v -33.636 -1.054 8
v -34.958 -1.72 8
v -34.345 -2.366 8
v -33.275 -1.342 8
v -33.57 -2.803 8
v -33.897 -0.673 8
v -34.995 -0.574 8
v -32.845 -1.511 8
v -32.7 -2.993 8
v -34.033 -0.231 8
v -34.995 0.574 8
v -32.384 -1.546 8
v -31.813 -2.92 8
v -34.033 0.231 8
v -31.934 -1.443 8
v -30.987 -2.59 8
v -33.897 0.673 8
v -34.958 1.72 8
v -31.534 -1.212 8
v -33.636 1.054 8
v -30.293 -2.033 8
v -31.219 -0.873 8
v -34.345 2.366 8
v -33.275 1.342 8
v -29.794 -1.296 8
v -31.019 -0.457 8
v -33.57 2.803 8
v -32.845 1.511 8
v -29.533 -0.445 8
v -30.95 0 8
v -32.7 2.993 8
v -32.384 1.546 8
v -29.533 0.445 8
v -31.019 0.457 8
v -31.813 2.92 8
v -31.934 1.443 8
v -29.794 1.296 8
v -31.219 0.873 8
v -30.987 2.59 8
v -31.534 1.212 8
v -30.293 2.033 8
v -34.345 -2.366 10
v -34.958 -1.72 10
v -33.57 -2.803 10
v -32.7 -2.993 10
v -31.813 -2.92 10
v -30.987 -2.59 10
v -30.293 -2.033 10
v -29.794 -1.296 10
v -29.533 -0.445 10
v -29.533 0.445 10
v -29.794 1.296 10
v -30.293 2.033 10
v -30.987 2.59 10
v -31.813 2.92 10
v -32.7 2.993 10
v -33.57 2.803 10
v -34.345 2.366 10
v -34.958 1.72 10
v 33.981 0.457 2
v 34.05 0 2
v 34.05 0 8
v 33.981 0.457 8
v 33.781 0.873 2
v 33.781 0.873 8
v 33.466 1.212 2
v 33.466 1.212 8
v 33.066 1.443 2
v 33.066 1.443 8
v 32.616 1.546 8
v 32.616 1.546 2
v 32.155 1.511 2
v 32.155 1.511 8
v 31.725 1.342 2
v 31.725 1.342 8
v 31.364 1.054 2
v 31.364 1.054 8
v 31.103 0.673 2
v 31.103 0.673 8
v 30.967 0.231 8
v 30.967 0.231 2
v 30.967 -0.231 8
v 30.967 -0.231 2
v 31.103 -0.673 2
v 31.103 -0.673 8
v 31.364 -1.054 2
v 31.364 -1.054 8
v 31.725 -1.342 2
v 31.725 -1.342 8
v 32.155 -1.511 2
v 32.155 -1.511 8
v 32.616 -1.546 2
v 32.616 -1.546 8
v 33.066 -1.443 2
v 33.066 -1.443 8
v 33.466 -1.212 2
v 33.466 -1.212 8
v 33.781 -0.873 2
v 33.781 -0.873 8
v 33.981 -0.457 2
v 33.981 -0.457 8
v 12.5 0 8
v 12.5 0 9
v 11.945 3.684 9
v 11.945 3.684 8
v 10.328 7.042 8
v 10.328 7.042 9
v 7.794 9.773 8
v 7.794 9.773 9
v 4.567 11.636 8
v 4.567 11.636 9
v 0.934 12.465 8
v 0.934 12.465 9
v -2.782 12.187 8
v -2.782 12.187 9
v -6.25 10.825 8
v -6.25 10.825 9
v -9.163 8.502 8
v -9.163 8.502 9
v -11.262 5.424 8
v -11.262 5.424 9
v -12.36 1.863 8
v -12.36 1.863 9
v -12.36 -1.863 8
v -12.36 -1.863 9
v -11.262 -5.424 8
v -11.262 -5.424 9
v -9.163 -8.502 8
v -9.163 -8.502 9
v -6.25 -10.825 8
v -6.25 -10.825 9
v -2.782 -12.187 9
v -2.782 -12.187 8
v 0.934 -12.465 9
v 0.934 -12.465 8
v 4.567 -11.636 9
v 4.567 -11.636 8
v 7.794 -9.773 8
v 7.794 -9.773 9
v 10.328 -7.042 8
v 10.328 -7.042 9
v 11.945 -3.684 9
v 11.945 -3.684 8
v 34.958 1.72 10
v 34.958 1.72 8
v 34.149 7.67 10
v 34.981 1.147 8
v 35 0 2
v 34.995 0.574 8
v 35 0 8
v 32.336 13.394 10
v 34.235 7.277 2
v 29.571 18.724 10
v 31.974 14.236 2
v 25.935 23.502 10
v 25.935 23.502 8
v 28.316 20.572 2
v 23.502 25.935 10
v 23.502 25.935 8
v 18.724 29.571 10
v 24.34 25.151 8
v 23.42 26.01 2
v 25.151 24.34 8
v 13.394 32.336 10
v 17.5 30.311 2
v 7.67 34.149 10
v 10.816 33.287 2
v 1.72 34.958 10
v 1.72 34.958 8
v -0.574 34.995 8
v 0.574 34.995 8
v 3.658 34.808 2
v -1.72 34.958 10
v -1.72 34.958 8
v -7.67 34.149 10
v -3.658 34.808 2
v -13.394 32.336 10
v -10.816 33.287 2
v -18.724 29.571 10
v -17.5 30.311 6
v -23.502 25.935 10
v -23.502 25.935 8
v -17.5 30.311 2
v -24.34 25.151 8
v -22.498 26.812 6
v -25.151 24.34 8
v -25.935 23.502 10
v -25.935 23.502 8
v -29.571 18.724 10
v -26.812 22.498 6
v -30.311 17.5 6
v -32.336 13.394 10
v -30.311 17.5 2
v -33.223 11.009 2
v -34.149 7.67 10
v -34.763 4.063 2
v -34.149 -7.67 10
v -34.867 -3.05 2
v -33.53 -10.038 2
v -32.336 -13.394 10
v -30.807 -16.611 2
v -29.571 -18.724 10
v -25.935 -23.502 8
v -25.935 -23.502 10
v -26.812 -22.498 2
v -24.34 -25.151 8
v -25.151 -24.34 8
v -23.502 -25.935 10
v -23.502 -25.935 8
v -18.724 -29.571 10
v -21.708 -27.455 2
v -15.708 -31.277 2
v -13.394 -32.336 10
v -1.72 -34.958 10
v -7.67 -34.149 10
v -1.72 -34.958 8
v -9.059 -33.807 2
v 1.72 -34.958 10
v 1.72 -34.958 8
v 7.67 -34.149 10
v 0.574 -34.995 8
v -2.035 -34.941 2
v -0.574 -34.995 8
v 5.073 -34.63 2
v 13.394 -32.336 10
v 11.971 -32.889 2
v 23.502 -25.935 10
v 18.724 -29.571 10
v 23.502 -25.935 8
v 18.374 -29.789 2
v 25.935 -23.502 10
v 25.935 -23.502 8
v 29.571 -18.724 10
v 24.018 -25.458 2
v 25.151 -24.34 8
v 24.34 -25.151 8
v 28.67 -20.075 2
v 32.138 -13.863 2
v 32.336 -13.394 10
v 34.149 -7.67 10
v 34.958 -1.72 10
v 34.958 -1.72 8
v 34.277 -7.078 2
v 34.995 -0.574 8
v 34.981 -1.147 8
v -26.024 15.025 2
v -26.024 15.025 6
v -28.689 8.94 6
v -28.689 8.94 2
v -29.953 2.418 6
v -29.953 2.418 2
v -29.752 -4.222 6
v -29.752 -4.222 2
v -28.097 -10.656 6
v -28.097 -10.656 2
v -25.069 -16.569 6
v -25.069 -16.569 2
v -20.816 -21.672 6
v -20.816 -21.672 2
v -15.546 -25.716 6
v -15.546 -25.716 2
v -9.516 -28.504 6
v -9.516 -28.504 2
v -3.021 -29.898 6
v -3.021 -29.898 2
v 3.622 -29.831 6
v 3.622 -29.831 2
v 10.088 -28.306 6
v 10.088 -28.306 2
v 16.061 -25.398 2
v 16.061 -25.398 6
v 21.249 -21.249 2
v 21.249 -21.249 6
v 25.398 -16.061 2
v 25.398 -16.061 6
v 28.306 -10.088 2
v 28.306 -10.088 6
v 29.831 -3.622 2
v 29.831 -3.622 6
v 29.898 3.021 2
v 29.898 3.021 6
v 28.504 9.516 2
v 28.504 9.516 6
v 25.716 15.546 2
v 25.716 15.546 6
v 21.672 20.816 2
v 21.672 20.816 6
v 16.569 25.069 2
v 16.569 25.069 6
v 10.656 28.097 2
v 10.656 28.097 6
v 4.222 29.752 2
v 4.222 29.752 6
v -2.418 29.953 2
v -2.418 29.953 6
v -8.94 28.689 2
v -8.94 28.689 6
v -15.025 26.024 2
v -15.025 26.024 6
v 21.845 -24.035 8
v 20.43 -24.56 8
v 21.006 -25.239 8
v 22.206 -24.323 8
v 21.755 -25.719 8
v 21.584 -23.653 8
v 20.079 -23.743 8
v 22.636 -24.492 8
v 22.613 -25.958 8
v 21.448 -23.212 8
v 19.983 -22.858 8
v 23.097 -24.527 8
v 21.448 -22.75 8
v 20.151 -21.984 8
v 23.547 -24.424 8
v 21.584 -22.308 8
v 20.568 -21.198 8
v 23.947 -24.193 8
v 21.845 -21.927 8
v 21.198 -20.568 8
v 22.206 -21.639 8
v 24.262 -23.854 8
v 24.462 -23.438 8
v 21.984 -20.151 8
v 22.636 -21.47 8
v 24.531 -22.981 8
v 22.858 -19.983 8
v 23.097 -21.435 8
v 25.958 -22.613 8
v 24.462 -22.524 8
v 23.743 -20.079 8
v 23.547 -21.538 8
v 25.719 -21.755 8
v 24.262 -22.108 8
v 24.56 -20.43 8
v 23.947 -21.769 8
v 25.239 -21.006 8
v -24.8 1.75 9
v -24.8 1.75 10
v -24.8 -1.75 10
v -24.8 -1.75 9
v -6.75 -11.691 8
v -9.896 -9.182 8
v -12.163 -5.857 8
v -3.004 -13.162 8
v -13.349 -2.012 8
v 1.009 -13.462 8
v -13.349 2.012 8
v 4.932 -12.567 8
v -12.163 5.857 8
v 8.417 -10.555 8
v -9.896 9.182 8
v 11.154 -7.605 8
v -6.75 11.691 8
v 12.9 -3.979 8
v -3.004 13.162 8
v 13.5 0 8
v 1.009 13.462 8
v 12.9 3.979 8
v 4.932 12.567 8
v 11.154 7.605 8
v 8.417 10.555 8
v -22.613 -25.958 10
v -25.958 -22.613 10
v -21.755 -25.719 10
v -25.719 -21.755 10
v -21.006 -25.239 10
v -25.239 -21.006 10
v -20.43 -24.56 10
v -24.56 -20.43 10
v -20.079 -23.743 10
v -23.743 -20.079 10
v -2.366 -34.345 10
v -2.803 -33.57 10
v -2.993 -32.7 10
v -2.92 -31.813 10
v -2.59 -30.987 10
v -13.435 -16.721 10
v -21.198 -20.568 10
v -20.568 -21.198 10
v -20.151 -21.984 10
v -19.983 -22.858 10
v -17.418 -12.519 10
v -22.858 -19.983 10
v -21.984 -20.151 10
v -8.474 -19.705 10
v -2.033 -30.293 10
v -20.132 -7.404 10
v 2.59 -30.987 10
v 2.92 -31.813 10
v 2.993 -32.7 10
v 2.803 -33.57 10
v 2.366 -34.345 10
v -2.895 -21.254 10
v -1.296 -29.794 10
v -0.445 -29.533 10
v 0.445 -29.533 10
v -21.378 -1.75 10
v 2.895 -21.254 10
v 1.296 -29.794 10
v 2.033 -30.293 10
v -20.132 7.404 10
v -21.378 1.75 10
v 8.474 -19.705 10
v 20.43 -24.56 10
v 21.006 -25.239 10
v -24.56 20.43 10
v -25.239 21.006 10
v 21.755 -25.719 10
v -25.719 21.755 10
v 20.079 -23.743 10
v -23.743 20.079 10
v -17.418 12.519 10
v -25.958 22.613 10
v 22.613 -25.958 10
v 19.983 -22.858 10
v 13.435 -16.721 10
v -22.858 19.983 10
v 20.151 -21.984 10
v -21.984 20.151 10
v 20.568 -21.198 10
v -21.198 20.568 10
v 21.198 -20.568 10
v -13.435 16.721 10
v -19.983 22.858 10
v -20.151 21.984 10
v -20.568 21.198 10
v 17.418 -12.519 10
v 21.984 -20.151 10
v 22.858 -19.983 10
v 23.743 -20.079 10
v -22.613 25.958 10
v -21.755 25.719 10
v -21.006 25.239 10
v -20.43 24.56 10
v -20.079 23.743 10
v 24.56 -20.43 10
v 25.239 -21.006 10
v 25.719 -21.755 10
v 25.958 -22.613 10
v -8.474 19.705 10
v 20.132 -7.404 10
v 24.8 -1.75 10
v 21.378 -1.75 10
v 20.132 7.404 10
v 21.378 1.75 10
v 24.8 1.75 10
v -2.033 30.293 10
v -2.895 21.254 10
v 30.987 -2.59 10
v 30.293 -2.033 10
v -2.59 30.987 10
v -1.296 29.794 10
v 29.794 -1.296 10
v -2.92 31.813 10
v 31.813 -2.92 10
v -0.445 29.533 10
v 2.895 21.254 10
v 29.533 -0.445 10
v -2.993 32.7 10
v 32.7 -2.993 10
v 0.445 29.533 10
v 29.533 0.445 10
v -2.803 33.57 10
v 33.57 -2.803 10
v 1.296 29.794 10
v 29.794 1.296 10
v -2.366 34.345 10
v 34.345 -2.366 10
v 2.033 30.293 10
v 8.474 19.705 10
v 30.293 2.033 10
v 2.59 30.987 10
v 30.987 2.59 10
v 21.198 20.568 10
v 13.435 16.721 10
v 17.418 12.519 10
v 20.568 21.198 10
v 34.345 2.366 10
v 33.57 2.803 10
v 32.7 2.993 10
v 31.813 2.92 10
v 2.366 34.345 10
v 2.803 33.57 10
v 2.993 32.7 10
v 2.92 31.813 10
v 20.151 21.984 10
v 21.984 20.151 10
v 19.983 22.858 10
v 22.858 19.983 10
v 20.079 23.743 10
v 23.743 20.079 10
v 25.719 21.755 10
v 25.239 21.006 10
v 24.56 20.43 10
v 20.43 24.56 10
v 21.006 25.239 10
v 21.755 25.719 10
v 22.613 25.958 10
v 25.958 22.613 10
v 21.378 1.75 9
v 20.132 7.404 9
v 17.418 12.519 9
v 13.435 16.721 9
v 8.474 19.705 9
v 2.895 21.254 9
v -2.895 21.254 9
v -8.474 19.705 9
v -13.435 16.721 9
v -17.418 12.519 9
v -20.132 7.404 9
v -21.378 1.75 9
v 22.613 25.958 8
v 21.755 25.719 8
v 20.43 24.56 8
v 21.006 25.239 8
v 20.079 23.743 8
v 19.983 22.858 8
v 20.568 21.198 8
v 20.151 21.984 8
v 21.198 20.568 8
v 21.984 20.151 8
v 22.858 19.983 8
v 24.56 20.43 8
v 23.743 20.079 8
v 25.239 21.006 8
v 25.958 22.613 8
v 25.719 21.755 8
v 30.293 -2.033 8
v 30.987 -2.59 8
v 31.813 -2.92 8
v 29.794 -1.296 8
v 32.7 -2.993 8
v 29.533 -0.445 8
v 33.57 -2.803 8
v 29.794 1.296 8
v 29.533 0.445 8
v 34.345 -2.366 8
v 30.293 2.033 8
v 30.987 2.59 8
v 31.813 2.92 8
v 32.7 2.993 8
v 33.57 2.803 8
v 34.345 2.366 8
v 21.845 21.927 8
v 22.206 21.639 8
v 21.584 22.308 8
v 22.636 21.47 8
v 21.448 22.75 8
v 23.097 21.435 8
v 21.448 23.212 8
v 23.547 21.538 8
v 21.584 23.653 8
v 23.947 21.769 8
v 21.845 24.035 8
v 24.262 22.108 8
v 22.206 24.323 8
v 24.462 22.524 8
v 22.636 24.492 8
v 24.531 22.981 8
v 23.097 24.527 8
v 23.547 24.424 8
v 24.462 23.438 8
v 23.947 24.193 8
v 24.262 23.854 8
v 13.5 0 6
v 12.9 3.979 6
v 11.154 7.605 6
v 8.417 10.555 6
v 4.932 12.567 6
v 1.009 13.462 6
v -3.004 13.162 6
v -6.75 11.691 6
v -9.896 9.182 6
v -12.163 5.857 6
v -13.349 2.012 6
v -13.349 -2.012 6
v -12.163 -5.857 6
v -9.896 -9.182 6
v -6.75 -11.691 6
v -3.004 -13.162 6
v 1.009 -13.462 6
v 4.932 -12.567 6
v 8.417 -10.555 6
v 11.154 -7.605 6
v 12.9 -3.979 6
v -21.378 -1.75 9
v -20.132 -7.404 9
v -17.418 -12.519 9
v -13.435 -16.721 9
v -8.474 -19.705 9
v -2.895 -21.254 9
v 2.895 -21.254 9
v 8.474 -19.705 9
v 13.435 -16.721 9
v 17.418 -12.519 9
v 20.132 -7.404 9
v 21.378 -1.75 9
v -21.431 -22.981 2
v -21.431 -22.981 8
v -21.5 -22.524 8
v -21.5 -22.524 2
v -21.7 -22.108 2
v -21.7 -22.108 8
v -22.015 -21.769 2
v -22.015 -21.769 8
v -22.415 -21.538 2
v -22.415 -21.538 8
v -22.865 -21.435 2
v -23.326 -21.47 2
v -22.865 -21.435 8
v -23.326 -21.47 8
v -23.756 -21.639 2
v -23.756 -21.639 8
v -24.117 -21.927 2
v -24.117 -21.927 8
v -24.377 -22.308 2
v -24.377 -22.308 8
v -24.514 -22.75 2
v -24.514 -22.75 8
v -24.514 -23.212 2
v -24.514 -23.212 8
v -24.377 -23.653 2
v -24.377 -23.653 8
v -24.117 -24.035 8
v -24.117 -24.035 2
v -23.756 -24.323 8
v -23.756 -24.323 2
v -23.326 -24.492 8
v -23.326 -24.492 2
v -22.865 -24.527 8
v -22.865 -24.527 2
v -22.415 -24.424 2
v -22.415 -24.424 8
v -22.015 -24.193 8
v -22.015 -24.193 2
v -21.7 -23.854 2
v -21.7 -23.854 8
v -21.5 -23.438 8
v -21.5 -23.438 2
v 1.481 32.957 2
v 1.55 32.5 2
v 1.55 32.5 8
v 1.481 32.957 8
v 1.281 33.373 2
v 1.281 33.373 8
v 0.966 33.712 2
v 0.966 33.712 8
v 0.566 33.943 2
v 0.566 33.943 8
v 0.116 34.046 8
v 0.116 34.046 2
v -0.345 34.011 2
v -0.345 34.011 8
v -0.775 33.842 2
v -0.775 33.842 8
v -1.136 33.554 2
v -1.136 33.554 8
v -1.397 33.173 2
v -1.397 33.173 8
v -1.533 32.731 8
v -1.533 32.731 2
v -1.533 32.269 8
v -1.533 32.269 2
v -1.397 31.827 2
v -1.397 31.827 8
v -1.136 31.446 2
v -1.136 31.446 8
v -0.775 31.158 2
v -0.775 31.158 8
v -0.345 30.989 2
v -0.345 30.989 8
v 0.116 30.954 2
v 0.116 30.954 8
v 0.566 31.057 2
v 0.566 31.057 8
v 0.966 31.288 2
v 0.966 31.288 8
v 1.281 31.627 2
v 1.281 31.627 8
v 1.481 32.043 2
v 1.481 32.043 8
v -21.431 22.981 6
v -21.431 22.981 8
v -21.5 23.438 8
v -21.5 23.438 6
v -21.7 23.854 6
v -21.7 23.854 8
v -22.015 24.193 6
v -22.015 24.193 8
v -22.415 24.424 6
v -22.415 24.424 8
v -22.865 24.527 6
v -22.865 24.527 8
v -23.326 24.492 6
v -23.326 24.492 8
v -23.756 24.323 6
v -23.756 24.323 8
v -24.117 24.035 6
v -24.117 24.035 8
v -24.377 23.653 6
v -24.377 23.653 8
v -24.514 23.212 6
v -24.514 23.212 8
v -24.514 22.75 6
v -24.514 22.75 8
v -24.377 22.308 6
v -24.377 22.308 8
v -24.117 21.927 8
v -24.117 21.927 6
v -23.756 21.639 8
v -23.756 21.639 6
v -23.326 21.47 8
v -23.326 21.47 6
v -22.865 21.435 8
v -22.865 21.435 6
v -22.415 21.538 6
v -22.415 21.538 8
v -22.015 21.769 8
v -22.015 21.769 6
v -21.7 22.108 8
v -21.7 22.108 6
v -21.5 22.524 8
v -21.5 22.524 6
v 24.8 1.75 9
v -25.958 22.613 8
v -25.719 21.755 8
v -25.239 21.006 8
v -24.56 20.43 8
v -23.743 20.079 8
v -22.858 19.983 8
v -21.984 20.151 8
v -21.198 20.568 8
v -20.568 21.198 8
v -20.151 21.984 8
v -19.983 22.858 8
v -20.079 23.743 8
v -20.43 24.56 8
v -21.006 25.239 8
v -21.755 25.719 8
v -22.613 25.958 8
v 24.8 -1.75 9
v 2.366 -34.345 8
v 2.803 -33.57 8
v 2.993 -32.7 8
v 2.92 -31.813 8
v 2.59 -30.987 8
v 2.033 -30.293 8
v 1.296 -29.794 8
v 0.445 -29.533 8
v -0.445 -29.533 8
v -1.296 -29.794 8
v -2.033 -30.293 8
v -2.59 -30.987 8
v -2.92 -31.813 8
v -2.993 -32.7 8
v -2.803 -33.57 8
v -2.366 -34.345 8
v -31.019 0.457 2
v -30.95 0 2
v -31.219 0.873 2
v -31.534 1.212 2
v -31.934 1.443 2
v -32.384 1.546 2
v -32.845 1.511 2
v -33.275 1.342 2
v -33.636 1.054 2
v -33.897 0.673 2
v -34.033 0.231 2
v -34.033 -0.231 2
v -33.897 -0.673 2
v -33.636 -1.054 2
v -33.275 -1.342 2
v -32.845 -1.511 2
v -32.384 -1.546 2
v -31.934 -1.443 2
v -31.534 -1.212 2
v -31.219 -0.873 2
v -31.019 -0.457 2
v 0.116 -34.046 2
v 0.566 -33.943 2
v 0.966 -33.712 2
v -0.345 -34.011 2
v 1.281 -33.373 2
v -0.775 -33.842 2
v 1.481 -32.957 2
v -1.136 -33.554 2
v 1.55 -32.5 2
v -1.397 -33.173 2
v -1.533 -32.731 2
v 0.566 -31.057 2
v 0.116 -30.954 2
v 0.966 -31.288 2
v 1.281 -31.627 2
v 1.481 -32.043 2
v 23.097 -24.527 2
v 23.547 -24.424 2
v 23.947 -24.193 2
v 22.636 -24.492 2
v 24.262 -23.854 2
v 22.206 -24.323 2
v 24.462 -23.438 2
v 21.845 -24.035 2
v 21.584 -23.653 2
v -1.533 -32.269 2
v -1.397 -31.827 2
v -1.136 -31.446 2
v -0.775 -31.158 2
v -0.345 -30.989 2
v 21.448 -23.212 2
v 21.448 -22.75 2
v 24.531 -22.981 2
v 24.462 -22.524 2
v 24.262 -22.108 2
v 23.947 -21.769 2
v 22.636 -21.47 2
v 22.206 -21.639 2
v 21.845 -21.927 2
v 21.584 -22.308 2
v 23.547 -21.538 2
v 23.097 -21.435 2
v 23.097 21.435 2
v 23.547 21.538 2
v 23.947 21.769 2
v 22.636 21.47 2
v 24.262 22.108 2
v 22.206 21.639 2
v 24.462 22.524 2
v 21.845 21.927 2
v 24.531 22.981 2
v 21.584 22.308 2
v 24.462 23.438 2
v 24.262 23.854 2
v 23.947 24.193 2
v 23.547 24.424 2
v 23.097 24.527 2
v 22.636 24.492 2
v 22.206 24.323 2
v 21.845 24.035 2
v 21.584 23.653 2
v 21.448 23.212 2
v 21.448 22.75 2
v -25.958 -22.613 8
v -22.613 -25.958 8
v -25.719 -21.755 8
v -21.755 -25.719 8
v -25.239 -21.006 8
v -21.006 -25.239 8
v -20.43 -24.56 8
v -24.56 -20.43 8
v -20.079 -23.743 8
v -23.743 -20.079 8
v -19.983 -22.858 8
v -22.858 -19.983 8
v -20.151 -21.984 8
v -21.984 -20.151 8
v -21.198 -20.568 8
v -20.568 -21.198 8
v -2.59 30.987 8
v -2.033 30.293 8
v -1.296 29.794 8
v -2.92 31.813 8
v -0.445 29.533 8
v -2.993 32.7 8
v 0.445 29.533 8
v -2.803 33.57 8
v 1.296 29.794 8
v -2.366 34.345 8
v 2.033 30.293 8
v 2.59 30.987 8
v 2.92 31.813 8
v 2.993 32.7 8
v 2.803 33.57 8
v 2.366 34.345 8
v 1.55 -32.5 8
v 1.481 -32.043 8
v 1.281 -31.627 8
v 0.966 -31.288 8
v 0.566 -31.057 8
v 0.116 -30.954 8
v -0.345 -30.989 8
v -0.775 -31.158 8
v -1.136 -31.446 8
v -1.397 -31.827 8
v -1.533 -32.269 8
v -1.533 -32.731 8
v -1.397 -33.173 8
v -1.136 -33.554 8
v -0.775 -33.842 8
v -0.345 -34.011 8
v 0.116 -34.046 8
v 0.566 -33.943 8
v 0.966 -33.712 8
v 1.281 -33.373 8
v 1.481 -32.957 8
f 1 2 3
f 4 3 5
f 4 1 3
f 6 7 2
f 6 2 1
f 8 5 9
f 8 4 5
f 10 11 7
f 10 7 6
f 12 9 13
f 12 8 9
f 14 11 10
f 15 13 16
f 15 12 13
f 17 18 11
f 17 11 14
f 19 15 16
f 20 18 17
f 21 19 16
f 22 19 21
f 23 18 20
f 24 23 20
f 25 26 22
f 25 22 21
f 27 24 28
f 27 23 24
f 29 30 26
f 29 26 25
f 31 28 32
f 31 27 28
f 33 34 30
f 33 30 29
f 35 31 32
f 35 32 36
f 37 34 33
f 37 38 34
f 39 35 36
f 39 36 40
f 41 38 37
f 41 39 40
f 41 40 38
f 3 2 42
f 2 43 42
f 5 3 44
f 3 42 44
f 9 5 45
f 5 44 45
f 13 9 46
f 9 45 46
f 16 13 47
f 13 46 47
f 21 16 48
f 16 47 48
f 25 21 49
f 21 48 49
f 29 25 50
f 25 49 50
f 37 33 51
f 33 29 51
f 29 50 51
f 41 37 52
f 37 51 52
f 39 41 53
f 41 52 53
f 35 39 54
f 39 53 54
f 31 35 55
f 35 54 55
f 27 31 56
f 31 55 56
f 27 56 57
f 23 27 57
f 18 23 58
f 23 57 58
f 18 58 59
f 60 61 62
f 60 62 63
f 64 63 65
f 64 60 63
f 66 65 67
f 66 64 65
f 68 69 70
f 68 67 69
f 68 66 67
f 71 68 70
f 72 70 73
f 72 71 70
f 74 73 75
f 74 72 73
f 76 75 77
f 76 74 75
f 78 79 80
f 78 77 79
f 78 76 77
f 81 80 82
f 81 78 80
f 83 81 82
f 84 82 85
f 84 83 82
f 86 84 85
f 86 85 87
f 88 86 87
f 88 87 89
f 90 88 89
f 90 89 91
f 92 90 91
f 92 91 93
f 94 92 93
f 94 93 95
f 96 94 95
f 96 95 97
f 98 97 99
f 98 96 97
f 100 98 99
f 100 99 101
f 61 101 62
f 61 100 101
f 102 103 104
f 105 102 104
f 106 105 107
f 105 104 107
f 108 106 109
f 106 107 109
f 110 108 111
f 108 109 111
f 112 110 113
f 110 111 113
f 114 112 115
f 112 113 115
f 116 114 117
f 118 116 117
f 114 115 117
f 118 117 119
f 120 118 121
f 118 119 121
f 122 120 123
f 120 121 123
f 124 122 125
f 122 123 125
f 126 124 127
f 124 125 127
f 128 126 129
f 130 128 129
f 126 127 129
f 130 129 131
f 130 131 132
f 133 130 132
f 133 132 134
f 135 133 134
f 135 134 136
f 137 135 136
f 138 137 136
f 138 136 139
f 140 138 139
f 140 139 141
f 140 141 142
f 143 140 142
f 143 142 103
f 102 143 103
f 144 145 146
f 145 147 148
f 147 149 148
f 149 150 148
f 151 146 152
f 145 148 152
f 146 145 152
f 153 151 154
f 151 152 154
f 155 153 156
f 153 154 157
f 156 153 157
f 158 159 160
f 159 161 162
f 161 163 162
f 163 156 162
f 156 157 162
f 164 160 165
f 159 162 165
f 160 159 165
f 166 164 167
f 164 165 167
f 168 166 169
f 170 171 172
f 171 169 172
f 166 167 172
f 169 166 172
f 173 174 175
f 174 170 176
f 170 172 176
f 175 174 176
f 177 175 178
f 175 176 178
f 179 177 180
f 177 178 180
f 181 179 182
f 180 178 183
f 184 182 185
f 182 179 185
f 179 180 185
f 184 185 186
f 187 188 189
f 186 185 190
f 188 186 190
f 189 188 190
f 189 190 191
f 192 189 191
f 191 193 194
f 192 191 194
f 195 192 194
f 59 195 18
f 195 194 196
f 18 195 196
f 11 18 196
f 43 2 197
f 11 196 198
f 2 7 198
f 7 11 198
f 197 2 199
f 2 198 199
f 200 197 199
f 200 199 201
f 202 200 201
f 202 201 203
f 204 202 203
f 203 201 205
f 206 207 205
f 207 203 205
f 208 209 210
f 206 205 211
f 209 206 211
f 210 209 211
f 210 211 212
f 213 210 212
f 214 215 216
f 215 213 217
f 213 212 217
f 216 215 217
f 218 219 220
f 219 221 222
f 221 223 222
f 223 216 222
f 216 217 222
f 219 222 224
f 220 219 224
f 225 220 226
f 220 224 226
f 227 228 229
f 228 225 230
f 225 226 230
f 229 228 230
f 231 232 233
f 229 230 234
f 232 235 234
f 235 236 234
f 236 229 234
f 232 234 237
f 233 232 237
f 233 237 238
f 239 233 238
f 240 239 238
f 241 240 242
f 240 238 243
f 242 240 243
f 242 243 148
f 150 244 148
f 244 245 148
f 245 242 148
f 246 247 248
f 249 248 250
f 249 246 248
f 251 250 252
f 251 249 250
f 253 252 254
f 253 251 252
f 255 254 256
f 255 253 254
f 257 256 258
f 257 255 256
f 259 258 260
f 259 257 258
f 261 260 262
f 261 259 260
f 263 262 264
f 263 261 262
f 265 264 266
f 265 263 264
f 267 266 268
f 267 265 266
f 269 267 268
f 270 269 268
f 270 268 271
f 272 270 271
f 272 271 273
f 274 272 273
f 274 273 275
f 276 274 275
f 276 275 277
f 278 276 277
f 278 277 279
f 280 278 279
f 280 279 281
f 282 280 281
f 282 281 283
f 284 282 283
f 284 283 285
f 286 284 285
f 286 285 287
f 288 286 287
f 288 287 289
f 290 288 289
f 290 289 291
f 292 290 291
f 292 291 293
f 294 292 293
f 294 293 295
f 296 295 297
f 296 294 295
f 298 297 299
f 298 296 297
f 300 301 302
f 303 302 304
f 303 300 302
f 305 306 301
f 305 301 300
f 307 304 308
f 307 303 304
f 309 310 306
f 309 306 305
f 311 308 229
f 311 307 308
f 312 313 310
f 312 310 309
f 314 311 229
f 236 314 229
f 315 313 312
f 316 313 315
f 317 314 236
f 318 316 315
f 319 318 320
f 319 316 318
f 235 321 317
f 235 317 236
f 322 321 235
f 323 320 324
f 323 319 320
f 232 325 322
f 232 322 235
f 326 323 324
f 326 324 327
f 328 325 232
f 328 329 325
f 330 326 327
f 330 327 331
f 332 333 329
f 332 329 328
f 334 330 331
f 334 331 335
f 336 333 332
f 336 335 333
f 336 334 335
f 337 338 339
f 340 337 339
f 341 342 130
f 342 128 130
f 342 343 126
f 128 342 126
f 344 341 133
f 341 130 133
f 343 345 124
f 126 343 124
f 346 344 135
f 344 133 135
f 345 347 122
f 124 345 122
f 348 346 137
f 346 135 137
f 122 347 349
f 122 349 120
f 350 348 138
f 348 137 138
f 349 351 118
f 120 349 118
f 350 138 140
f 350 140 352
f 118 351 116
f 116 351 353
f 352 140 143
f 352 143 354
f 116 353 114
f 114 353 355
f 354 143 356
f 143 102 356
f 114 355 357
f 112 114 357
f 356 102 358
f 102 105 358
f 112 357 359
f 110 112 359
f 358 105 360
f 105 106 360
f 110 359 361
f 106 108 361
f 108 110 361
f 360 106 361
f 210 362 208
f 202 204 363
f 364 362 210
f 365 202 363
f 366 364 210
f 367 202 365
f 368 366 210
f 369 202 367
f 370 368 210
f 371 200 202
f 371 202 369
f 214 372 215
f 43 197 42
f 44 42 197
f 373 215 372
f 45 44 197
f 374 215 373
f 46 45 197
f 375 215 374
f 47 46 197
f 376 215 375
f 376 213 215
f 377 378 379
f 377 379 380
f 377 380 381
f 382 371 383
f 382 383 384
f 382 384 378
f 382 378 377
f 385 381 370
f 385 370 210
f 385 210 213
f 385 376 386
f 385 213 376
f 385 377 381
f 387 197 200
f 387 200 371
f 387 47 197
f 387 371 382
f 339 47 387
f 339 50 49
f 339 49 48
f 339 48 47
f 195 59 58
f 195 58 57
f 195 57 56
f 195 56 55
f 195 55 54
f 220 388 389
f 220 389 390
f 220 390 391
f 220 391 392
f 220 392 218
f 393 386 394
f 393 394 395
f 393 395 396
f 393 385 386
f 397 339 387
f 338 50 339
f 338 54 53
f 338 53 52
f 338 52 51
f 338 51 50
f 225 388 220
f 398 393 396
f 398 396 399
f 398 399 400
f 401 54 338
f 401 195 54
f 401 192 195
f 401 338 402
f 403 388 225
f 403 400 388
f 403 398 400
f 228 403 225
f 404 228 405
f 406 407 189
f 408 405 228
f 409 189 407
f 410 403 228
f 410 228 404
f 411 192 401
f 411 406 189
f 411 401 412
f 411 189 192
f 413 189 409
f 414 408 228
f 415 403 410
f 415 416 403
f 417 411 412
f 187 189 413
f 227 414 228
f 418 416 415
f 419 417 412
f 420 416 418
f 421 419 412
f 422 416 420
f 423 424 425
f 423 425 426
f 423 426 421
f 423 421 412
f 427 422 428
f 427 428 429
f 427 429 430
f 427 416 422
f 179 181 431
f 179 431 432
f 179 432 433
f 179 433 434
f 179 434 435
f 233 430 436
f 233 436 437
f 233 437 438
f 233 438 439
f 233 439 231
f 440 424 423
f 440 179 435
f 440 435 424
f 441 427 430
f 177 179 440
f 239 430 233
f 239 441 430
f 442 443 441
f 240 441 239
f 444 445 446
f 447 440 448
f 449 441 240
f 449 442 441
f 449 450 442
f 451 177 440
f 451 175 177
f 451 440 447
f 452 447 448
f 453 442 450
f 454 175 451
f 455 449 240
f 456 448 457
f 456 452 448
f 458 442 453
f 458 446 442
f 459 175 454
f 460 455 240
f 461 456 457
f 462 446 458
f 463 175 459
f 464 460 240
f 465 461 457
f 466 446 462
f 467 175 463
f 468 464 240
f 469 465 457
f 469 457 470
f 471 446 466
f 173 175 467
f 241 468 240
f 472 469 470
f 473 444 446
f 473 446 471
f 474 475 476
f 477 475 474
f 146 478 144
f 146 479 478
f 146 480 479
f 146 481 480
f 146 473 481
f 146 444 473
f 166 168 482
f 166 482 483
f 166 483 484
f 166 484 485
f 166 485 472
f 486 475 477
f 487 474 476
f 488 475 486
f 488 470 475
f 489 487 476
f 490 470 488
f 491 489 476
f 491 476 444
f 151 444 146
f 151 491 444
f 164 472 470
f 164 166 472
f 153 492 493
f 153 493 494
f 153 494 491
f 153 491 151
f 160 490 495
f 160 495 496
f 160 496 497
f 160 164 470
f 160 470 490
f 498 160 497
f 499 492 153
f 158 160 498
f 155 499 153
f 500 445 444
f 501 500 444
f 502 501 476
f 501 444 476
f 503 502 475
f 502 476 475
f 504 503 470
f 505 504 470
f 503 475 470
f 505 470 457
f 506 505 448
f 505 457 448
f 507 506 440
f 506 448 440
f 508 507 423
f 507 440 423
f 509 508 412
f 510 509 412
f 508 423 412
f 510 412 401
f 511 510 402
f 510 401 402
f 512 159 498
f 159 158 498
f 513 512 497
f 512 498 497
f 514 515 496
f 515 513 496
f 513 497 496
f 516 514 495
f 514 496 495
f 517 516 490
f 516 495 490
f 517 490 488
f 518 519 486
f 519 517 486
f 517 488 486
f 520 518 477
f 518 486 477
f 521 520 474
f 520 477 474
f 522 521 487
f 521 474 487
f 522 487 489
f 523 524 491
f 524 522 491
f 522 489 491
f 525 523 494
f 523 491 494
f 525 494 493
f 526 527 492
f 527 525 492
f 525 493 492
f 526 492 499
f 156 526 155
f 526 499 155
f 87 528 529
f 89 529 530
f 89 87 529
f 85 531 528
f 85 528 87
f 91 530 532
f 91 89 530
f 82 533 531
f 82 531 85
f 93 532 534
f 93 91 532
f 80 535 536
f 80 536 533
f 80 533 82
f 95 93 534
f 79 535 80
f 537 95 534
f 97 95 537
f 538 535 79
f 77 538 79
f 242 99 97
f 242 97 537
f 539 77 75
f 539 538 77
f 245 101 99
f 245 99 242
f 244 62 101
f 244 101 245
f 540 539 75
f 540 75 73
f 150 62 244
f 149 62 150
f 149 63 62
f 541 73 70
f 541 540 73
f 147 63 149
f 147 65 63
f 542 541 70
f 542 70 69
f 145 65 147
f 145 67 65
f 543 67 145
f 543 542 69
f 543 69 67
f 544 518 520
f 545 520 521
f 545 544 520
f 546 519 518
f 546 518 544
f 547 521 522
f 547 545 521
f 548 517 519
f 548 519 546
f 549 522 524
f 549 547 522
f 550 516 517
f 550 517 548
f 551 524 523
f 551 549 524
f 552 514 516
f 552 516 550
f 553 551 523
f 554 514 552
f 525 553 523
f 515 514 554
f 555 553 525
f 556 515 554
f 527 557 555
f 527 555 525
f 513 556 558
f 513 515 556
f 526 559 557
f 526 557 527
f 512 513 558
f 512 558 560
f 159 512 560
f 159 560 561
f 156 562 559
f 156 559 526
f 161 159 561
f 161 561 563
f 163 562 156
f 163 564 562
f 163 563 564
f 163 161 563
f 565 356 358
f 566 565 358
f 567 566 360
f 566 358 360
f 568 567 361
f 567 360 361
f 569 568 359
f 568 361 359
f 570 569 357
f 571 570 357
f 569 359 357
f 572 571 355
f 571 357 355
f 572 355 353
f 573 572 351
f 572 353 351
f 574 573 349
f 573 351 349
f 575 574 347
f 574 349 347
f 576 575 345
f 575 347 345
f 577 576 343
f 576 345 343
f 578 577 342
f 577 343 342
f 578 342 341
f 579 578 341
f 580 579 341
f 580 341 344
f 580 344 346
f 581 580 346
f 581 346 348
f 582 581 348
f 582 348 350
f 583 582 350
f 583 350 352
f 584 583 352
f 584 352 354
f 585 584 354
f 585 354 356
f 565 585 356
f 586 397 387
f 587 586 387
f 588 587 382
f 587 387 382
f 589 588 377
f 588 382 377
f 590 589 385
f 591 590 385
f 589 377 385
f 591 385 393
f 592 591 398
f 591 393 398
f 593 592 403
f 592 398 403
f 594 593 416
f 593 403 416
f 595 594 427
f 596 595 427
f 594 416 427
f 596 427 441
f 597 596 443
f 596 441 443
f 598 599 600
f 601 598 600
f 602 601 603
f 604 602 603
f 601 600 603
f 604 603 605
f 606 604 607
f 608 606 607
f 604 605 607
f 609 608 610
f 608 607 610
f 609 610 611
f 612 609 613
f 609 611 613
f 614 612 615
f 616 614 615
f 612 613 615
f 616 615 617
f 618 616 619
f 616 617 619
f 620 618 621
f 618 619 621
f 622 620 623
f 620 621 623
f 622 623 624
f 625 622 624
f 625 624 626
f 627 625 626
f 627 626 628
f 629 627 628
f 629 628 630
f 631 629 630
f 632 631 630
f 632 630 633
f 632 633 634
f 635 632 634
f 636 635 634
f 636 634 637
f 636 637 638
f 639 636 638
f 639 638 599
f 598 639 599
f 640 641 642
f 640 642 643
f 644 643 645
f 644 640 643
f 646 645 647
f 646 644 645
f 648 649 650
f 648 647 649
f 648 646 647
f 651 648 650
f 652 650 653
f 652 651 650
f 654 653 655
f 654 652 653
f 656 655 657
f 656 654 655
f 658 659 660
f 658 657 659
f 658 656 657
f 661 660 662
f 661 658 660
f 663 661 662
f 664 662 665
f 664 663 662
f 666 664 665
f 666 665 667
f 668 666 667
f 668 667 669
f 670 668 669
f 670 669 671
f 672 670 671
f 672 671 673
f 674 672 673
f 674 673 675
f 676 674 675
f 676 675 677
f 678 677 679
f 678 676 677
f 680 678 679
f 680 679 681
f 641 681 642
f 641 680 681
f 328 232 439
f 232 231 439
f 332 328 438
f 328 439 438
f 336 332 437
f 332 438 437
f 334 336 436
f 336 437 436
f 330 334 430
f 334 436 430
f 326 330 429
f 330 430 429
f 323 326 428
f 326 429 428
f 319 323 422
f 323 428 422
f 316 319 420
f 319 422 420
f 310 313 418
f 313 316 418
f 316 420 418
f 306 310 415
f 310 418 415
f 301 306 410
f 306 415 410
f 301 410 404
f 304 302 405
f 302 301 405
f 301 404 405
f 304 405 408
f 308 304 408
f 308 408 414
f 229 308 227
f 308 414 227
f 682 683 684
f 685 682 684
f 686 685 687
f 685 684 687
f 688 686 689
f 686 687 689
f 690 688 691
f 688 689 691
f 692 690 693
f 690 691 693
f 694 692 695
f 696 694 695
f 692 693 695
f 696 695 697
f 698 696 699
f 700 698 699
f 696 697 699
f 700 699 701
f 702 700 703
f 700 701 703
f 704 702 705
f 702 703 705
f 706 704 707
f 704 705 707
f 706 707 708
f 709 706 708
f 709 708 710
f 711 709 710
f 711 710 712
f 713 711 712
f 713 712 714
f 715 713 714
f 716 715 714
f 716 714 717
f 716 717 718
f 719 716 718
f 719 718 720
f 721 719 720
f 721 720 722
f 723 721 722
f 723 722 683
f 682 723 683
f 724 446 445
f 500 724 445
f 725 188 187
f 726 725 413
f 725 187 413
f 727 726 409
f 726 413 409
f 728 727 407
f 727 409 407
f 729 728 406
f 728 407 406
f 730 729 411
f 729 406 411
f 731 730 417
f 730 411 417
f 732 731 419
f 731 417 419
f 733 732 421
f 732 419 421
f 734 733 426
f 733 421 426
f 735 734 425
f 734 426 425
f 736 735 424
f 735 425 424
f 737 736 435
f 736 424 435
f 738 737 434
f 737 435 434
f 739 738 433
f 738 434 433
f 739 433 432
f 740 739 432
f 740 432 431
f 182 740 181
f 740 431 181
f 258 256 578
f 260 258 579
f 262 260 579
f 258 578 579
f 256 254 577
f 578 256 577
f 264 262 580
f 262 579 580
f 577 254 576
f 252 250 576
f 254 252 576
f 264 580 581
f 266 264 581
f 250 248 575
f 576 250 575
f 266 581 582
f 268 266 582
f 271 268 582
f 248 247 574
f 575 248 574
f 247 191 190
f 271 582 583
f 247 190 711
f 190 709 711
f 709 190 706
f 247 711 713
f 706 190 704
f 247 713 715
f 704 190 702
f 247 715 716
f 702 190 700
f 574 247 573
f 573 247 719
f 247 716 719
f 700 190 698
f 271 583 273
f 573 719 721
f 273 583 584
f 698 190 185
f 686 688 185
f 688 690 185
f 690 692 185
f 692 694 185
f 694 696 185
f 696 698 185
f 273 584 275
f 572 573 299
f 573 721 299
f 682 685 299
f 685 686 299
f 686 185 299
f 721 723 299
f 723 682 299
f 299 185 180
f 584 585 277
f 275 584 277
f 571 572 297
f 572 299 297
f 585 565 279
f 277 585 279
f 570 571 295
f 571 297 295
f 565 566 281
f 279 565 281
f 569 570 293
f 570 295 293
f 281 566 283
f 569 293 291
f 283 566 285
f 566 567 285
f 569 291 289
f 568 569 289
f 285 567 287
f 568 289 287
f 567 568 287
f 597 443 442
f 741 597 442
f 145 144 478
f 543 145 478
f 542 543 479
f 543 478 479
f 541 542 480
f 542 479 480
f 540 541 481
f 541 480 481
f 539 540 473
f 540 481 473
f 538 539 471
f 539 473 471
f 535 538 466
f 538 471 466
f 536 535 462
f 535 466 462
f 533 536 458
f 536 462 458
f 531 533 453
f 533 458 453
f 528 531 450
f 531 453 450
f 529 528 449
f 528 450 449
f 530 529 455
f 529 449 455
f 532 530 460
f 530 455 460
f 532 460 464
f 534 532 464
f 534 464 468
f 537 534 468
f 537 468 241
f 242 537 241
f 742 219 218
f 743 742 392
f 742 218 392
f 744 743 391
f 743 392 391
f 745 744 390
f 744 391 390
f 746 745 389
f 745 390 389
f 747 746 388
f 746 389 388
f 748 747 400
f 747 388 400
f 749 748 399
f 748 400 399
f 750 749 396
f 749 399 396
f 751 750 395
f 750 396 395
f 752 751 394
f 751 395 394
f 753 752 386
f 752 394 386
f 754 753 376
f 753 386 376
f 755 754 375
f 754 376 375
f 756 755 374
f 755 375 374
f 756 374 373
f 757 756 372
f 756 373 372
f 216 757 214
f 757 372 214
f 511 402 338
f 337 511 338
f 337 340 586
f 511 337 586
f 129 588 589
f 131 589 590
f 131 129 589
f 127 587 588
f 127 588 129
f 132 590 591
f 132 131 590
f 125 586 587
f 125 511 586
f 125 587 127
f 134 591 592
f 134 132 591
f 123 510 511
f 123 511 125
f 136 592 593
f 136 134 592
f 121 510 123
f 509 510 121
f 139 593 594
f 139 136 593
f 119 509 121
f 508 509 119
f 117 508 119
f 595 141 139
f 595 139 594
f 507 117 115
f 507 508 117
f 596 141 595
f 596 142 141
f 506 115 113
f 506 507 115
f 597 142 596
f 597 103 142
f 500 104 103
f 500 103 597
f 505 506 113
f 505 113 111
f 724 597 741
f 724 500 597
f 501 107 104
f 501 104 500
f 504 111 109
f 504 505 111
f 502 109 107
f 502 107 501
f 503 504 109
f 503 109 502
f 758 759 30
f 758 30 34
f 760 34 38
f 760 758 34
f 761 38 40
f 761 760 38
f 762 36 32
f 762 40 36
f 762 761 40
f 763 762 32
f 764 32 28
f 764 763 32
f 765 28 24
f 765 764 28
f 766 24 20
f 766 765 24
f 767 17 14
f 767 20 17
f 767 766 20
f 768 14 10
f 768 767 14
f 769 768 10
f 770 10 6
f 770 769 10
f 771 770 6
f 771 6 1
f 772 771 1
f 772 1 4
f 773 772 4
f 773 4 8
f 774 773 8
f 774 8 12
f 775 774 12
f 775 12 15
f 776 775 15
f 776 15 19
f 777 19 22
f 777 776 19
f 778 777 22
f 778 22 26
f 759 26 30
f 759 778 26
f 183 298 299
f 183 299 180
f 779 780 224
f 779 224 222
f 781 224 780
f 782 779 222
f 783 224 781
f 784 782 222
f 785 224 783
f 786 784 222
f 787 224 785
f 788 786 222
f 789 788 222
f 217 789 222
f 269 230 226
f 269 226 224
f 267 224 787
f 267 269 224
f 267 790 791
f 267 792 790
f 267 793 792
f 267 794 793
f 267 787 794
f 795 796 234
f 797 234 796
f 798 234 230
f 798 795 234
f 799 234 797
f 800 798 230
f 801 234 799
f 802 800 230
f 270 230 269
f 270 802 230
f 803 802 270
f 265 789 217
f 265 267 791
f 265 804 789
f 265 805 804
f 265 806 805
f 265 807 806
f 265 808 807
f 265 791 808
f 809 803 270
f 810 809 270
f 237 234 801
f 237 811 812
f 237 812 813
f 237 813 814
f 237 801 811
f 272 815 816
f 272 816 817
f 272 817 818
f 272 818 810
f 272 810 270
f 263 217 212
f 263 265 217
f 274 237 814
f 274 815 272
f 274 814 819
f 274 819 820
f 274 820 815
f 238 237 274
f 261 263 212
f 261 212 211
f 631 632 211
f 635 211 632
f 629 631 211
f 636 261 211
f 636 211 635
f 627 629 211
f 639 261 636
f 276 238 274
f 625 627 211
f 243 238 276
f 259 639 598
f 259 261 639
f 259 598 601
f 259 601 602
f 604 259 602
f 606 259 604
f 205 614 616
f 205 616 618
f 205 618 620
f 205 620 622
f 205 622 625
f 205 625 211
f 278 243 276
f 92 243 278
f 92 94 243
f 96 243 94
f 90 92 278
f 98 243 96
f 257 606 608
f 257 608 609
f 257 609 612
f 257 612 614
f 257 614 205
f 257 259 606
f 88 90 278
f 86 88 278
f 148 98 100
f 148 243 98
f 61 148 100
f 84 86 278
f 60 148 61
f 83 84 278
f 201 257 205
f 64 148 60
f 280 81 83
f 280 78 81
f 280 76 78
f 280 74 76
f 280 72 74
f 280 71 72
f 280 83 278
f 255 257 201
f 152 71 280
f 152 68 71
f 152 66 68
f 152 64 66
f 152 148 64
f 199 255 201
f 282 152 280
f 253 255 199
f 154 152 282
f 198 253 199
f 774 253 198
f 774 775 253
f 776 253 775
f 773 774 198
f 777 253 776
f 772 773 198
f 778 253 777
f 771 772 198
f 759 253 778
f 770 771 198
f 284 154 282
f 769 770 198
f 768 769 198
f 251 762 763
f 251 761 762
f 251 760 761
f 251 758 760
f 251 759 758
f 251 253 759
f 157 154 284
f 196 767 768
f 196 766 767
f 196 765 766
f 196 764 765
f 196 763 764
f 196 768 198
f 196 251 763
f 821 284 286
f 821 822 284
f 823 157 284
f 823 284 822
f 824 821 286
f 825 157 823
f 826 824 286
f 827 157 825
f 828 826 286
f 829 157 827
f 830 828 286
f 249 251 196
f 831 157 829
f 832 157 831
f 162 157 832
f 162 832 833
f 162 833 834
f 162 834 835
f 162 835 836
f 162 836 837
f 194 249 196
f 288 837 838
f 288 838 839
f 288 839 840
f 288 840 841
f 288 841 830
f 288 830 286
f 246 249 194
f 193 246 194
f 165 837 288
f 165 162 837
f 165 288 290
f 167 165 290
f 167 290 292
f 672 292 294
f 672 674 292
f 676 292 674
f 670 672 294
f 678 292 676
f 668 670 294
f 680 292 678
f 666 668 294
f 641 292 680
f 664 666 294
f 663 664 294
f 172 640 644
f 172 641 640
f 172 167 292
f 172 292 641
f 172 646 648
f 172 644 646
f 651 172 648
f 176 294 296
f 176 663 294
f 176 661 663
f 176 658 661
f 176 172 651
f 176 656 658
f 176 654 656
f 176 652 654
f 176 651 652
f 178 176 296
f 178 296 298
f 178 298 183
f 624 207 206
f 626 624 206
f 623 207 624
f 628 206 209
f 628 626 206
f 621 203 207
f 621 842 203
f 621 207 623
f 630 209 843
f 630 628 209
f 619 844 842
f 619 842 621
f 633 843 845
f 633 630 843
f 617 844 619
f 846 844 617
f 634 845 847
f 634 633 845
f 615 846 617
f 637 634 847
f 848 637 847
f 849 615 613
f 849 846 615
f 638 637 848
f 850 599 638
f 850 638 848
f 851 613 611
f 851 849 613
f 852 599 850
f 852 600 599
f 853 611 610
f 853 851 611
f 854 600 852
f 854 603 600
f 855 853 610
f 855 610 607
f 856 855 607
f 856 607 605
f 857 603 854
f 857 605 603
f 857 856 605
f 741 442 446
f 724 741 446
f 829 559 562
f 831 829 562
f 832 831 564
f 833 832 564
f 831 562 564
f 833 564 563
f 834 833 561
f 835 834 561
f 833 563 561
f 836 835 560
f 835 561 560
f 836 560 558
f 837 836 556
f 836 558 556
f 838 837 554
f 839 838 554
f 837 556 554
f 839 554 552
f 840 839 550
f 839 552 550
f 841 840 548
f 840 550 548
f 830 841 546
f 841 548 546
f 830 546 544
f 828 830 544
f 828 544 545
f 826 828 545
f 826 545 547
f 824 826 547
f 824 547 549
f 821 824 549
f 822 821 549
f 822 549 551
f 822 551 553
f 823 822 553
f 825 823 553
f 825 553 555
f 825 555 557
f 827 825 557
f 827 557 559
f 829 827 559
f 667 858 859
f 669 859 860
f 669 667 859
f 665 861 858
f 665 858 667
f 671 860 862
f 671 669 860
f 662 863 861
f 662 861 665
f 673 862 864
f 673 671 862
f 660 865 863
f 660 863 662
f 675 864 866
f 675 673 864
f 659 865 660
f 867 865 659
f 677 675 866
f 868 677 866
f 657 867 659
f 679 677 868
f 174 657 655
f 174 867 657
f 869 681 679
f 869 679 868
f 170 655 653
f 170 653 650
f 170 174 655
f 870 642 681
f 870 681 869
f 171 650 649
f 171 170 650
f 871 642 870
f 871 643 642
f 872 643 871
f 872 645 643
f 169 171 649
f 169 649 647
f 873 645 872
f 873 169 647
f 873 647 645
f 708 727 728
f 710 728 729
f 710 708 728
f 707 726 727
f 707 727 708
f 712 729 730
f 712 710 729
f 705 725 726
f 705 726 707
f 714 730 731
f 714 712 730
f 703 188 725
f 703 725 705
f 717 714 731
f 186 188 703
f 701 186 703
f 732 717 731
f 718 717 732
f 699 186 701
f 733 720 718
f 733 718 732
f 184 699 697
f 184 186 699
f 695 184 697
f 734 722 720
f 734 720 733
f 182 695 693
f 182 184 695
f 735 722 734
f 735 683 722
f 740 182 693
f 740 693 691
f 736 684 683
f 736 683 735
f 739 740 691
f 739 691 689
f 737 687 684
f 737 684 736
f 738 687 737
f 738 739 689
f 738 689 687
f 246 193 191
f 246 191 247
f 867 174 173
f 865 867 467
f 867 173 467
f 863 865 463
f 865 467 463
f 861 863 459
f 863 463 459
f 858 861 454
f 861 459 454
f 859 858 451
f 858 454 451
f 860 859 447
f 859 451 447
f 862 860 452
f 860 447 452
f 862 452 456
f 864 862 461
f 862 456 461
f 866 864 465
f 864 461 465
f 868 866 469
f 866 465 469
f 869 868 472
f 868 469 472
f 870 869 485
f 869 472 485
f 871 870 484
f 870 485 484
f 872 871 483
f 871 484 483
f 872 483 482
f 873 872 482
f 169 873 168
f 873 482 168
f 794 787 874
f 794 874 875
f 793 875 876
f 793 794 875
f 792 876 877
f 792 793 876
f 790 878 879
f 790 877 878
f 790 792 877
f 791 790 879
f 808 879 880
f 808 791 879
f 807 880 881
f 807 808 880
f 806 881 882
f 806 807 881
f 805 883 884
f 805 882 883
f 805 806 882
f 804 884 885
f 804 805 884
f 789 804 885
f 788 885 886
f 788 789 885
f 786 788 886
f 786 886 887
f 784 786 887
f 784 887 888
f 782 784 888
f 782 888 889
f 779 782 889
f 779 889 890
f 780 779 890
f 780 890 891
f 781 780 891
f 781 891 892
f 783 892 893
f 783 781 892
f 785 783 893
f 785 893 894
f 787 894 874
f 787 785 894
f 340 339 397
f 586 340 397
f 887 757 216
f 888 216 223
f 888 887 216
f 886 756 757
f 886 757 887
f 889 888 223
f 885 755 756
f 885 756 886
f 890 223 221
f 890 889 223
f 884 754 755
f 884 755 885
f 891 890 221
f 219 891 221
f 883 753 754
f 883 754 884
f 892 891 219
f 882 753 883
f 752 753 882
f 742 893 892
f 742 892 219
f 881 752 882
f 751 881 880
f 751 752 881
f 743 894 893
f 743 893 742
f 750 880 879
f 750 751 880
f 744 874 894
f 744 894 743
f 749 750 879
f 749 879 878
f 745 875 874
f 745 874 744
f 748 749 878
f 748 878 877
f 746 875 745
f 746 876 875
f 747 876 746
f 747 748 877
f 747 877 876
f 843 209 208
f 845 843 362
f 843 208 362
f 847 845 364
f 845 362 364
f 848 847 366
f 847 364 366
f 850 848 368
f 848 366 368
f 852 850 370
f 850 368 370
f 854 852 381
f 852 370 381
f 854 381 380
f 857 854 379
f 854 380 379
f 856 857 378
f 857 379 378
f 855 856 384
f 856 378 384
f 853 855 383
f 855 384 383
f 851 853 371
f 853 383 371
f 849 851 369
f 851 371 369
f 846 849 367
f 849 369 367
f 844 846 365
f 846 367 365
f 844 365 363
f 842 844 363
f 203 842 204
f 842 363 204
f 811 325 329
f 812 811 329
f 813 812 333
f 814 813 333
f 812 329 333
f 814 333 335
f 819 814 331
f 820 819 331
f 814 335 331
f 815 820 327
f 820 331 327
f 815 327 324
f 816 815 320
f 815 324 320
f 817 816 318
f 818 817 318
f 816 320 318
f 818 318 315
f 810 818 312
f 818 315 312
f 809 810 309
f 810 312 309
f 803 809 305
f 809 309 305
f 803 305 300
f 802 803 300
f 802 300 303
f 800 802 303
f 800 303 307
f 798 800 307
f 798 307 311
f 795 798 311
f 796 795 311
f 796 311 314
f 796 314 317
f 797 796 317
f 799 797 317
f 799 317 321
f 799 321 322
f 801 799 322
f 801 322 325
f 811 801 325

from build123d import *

# Parameters (mm, degrees)
EXTRUDE_1_OUTLINE_R   = 35
EXTRUDE_1_OUTLINE_R_2 = 1.55
EXTRUDE_1_OUTLINE_R_3 = 30.05
EXTRUDE_1_DEPTH       = 10
SKETCH_2_R            = 33.525
SKETCH_2_R_2          = 18.525
EXTRUDE_1_2_DEPTH     = 4
SKETCH_3_R            = 1.55
CUT_EXTRUDE_1_DEPTH   = 51.497524692
CUT_EXTRUDE_2_DEPTH   = 6
SKETCH_8_R            = 35
SKETCH_8_R_2          = 30.05
CUT_EXTRUDE_3_DEPTH   = 2
SKETCH_9_R            = 3
CUT_EXTRUDE_4_DEPTH   = 2
SKETCH_10_R           = 1.55
CUT_EXTRUDE_5_DEPTH   = 51.139804547
SKETCH_11_R           = 3
CUT_EXTRUDE_6_DEPTH   = 2
SKETCH_14_R           = 18.525
SKETCH_14_R_2         = 13.5
EXTRUDE_2_DEPTH       = 4
SKETCH_15_R           = 17.5
CUT_EXTRUDE_8_DEPTH   = 1
SKETCH_17_R           = 17.5
SKETCH_17_R_2         = 12.5
CUT_EXTRUDE_9_DEPTH   = 1
SKETCH1_R             = 13.5
SKETCH1_R_2           = 12
BOSS_EXTRUDE1_DEPTH   = 1
SKETCH2_R             = 12.5
SKETCH2_R_2           = 12
CUT_EXTRUDE1_DEPTH    = 50.989999


# Read off the part's stored shape, not the designer's step: 凸台-拉伸1
with BuildPart() as part:
    # Extrude 1 outline → Extrude 1 (new body)
    with BuildSketch(Plane.XY):
        Circle(EXTRUDE_1_OUTLINE_R)
        with Locations((0, -32.5)):
            Circle(EXTRUDE_1_OUTLINE_R_2, mode=Mode.SUBTRACT)
        with Locations((-32.5, 0)):
            Circle(EXTRUDE_1_OUTLINE_R_2, mode=Mode.SUBTRACT)
        Circle(EXTRUDE_1_OUTLINE_R_3, mode=Mode.SUBTRACT)
        with Locations((32.5, 0)):
            Circle(EXTRUDE_1_OUTLINE_R_2, mode=Mode.SUBTRACT)
        with Locations((0, 32.5)):
            Circle(EXTRUDE_1_OUTLINE_R_2, mode=Mode.SUBTRACT)
    extrude(amount=EXTRUDE_1_DEPTH)

    # 草图2 → Extrude 1 2 (add)
    with BuildSketch(Plane.XY.offset(10)):
        Circle(SKETCH_2_R)
        Circle(SKETCH_2_R_2, mode=Mode.SUBTRACT)
    extrude(amount=-EXTRUDE_1_2_DEPTH)

    # 草图3 → 切除-拉伸1 (cut, through all)
    with BuildSketch(Plane(origin=(0, 0, 0), x_dir=(-1, 0, 0), z_dir=(0, 0, -1))):
        with Locations(Location((32.5, 0, 0), (0, 0, 180))):
            Circle(SKETCH_3_R)
        with Locations(Location((0, -32.5, 0), (0, 0, 180))):
            Circle(SKETCH_3_R)
        with Locations(Location((-32.5, 0, 0), (0, 0, 180))):
            Circle(SKETCH_3_R)
        with Locations(Location((0, 32.5, 0), (0, 0, 180))):
            Circle(SKETCH_3_R)
    extrude(amount=-CUT_EXTRUDE_1_DEPTH, mode=Mode.SUBTRACT)

    # 草图7 → 切除-拉伸2 (cut)
    with BuildSketch(Plane(origin=(0, 0, 0), x_dir=(-1, 0, 0), z_dir=(0, 0, -1))):
        with BuildLine():
            Line((15.025, 26.024063384), (17.5, 30.310889132))
            ThreePointArc((17.5, 30.310889132), (24.748737342, 24.748737342), (30.310889132, 17.5))
            Line((30.310889132, 17.5), (26.024063384, 15.025))
            ThreePointArc((26.024063384, 15.025), (21.248558775, 21.248558775), (15.025, 26.024063384))
        make_face()
    extrude(amount=-CUT_EXTRUDE_2_DEPTH, mode=Mode.SUBTRACT)

    # 草图8 → 切除-拉伸3 (cut)
    with BuildSketch(Plane(origin=(0, 0, 0), x_dir=(-1, 0, 0), z_dir=(0, 0, -1))):
        with Locations(Location((0, 0, 0), (0, 0, 30))):
            Circle(SKETCH_8_R)
        Circle(SKETCH_8_R_2, mode=Mode.SUBTRACT)
    extrude(amount=-CUT_EXTRUDE_3_DEPTH, mode=Mode.SUBTRACT)

    # 草图9 → 切除-拉伸4 (cut)
    with BuildSketch(Plane.XY.offset(10)):
        with Locations((0, 32.5)):
            Circle(SKETCH_9_R)
        with Locations((32.5, 0)):
            Circle(SKETCH_9_R)
        with Locations((0, -32.5)):
            Circle(SKETCH_9_R)
        with Locations((-32.5, 0)):
            Circle(SKETCH_9_R)
    extrude(amount=-CUT_EXTRUDE_4_DEPTH, mode=Mode.SUBTRACT)

    # 草图10 → 切除-拉伸5 (cut, through all)
    with BuildSketch(Plane.XY.offset(10)):
        with Locations((22.980970389, 22.980970389)):
            Circle(SKETCH_10_R)
        with Locations((22.980970389, -22.980970389)):
            Circle(SKETCH_10_R)
        with Locations((-22.980970389, -22.980970389)):
            Circle(SKETCH_10_R)
        with Locations((-22.980970389, 22.980970389)):
            Circle(SKETCH_10_R)
    extrude(amount=-CUT_EXTRUDE_5_DEPTH, mode=Mode.SUBTRACT)

    # 草图11 → 切除-拉伸6 (cut)
    with BuildSketch(Plane.XY.offset(10)):
        with Locations((22.980970389, 22.980970389)):
            Circle(SKETCH_11_R)
        with Locations((22.980970389, -22.980970389)):
            Circle(SKETCH_11_R)
        with Locations((-22.980970389, -22.980970389)):
            Circle(SKETCH_11_R)
        with Locations((-22.980970389, 22.980970389)):
            Circle(SKETCH_11_R)
    extrude(amount=-CUT_EXTRUDE_6_DEPTH, mode=Mode.SUBTRACT)

    # 草图14 → 凸台-拉伸2 (add)
    with BuildSketch(Plane.XY.offset(10)):
        Circle(SKETCH_14_R)
        Circle(SKETCH_14_R_2, mode=Mode.SUBTRACT)
    extrude(amount=-EXTRUDE_2_DEPTH)

    # 草图15 → 切除-拉伸8 (cut)
    with BuildSketch(Plane.XY.offset(10)):
        with BuildLine():
            ThreePointArc((21.378493867, 1.75), (0, 21.45), (-21.378493867, 1.75))
            Line((-21.378493866, 1.75), (-24.8, 1.75))
            Line((-24.8, 1.75), (-24.8, -1.75))
            Line((-24.8, -1.75), (-21.378493867, -1.75))
            ThreePointArc((-21.378493867, -1.75), (0, -21.45), (21.378493867, -1.75))
            Line((21.378493867, -1.75), (24.8, -1.75))
            Line((24.8, -1.75), (24.8, 1.75))
            Line((24.8, 1.75), (21.378493867, 1.75))
        make_face()
        Circle(SKETCH_15_R, mode=Mode.SUBTRACT)
    extrude(amount=-CUT_EXTRUDE_8_DEPTH, mode=Mode.SUBTRACT)

    # 草图17 → 切除-拉伸9 (cut)
    with BuildSketch(Plane.XY.offset(10)):
        Circle(SKETCH_17_R)
        Circle(SKETCH_17_R_2, mode=Mode.SUBTRACT)
    extrude(amount=-CUT_EXTRUDE_9_DEPTH, mode=Mode.SUBTRACT)

    # Sketch1 → Boss-Extrude1 (add)
    with BuildSketch(Plane.XY.offset(9)):
        Circle(SKETCH1_R)
        Circle(SKETCH1_R_2, mode=Mode.SUBTRACT)
    extrude(amount=-BOSS_EXTRUDE1_DEPTH)

    # Sketch2 → Cut-Extrude1 (cut, through all)
    with BuildSketch(Plane.XY.offset(9)):
        Circle(SKETCH2_R)
        Circle(SKETCH2_R_2, mode=Mode.SUBTRACT)
    extrude(amount=-CUT_EXTRUDE1_DEPTH, mode=Mode.SUBTRACT)


solid = part.part
